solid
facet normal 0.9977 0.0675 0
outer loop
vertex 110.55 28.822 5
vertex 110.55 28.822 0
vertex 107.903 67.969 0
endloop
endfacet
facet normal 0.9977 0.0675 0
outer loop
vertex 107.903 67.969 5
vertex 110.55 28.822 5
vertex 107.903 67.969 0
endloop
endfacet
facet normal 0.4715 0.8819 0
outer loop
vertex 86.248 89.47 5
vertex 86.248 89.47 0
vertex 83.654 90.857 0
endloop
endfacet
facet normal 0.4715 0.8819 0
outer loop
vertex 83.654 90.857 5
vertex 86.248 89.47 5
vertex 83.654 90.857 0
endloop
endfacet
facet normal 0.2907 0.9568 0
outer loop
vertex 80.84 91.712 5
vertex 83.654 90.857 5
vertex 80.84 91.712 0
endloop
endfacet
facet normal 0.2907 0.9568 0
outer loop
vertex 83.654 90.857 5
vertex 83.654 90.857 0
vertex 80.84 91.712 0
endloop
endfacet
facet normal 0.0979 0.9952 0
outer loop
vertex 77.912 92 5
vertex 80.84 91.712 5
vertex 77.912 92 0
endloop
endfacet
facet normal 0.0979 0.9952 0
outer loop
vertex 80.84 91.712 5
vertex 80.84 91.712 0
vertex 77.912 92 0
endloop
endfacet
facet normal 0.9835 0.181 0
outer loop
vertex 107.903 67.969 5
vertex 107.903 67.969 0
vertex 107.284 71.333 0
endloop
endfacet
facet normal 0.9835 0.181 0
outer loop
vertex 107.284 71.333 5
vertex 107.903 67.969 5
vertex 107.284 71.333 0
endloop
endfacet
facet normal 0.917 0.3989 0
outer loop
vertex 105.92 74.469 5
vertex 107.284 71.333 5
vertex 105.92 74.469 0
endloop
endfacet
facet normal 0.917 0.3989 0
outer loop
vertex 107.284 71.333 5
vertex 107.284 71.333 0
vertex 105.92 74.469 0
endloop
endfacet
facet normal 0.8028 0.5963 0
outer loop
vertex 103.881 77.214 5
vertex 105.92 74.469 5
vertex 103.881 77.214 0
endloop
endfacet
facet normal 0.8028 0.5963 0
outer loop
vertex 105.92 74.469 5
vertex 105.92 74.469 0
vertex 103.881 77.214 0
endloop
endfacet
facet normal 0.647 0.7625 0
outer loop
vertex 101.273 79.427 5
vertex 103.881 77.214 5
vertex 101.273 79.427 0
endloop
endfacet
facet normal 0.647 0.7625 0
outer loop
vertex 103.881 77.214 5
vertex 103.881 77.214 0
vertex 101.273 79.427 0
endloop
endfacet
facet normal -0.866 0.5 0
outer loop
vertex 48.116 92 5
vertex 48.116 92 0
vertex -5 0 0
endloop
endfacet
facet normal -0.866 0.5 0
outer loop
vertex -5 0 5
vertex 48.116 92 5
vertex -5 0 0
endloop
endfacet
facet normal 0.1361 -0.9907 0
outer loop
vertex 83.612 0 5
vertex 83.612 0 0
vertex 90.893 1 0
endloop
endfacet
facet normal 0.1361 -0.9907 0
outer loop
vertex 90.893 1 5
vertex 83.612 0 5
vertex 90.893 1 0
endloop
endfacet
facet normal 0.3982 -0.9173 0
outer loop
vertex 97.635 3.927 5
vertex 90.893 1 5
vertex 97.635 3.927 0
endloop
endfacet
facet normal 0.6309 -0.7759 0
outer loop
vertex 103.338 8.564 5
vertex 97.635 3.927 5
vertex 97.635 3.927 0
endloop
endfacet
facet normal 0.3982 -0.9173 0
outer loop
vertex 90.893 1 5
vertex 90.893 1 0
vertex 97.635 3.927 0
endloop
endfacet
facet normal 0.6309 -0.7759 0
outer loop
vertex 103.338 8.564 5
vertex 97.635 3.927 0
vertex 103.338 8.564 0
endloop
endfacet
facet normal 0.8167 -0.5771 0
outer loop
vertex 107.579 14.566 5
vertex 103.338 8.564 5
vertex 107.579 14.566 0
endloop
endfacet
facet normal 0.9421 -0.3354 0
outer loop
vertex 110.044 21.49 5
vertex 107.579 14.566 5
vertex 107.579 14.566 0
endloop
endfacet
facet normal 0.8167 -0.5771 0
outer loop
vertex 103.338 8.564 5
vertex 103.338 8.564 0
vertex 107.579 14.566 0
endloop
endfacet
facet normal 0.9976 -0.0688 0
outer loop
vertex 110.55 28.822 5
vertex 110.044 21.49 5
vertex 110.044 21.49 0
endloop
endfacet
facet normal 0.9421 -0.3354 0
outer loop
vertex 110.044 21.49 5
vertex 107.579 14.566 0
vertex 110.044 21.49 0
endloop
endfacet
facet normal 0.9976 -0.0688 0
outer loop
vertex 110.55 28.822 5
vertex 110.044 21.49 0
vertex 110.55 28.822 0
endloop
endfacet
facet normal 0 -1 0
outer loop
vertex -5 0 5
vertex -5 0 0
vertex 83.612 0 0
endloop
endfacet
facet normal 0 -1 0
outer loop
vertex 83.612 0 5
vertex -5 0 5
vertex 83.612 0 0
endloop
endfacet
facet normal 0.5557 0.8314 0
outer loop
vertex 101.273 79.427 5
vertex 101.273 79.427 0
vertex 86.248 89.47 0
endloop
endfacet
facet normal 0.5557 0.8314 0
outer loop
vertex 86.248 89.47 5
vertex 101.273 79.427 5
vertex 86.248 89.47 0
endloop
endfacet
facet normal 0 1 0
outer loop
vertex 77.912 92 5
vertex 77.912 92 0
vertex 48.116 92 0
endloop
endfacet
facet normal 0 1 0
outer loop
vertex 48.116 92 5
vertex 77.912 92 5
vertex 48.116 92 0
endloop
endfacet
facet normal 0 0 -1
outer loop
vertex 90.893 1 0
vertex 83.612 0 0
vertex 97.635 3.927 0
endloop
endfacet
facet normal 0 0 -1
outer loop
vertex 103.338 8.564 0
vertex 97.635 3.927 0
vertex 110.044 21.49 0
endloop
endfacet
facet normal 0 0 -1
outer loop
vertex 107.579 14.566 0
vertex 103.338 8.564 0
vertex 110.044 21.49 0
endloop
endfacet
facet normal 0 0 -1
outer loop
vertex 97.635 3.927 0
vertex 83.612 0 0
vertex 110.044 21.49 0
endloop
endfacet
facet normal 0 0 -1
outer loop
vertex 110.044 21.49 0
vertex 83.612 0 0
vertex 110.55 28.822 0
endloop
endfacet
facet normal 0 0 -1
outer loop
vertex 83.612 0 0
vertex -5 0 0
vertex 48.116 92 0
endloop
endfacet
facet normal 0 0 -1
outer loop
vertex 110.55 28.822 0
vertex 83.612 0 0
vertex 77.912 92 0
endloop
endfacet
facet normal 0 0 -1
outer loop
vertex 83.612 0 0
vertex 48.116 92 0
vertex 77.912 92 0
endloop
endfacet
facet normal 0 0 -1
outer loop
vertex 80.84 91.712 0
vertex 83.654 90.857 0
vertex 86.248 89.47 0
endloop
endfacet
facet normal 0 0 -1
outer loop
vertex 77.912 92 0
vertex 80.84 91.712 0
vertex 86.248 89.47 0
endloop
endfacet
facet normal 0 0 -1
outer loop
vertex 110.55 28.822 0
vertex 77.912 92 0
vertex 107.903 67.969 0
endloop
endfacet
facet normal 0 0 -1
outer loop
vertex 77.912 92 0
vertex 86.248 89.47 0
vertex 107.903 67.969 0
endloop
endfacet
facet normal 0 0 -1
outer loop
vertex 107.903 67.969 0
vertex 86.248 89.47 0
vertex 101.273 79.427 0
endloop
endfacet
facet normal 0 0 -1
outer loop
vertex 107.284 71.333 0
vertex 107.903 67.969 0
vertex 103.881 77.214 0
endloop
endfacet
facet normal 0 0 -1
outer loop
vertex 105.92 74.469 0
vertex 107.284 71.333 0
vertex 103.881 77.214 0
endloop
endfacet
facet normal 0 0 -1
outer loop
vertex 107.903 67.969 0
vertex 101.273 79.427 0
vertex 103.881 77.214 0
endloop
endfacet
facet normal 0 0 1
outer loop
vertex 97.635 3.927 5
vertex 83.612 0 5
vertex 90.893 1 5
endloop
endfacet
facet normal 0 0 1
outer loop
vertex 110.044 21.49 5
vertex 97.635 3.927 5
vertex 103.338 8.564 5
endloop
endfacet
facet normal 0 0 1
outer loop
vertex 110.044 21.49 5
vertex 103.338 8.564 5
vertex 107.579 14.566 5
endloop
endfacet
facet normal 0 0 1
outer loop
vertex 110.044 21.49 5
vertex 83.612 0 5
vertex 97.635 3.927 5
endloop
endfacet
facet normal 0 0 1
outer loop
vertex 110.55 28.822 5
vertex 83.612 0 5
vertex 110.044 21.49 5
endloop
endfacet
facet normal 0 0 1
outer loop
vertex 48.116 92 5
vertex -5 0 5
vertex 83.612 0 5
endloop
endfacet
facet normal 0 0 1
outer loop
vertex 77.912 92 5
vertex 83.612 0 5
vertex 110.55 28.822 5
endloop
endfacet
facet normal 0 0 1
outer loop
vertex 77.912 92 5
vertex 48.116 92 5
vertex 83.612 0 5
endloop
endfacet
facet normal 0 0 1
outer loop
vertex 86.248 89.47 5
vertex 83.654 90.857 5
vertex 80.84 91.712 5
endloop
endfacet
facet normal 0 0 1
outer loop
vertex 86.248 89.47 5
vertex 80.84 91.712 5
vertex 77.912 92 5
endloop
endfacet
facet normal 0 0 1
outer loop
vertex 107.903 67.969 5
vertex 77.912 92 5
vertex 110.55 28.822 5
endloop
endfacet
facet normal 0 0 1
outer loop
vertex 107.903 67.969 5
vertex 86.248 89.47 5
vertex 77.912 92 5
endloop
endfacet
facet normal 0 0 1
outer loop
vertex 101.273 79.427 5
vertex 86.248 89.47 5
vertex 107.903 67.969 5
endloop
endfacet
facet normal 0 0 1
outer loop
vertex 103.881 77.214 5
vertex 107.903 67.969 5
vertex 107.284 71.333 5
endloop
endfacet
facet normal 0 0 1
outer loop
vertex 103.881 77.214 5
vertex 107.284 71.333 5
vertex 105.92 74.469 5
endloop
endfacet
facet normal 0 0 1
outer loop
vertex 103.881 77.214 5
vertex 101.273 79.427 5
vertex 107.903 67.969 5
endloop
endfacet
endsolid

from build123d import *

# Parameters (mm, degrees)
BASE_EXTRUDE_DEPTH = 5


with BuildPart() as part:
    # Sketch2 → Base-Extrude (new body)
    with BuildSketch(Plane.XY):
        with BuildLine():
            Line((48.116224765, 92), (-5, 0))
            Line((-5, 0), (83.61203206, 0))
            ThreePointArc((83.61203206, 0), (103.33761172, 8.563582044), (110.550478804, 28.822110589))
            Line((110.550478804, 28.822110589), (107.902603037, 67.968834584))
            ThreePointArc((107.902603037, 67.968834584), (105.920101953, 74.468797721), (101.27285986, 79.426919569))
            Line((101.27285986, 79.426919569), (86.248315424, 89.470368646))
            ThreePointArc((86.248315424, 89.470368646), (82.267967787, 91.353667296), (77.912254854, 92))
            Line((77.912254854, 92), (48.116224765, 92))
        make_face()
    extrude(amount=BASE_EXTRUDE_DEPTH)


solid = part.part
